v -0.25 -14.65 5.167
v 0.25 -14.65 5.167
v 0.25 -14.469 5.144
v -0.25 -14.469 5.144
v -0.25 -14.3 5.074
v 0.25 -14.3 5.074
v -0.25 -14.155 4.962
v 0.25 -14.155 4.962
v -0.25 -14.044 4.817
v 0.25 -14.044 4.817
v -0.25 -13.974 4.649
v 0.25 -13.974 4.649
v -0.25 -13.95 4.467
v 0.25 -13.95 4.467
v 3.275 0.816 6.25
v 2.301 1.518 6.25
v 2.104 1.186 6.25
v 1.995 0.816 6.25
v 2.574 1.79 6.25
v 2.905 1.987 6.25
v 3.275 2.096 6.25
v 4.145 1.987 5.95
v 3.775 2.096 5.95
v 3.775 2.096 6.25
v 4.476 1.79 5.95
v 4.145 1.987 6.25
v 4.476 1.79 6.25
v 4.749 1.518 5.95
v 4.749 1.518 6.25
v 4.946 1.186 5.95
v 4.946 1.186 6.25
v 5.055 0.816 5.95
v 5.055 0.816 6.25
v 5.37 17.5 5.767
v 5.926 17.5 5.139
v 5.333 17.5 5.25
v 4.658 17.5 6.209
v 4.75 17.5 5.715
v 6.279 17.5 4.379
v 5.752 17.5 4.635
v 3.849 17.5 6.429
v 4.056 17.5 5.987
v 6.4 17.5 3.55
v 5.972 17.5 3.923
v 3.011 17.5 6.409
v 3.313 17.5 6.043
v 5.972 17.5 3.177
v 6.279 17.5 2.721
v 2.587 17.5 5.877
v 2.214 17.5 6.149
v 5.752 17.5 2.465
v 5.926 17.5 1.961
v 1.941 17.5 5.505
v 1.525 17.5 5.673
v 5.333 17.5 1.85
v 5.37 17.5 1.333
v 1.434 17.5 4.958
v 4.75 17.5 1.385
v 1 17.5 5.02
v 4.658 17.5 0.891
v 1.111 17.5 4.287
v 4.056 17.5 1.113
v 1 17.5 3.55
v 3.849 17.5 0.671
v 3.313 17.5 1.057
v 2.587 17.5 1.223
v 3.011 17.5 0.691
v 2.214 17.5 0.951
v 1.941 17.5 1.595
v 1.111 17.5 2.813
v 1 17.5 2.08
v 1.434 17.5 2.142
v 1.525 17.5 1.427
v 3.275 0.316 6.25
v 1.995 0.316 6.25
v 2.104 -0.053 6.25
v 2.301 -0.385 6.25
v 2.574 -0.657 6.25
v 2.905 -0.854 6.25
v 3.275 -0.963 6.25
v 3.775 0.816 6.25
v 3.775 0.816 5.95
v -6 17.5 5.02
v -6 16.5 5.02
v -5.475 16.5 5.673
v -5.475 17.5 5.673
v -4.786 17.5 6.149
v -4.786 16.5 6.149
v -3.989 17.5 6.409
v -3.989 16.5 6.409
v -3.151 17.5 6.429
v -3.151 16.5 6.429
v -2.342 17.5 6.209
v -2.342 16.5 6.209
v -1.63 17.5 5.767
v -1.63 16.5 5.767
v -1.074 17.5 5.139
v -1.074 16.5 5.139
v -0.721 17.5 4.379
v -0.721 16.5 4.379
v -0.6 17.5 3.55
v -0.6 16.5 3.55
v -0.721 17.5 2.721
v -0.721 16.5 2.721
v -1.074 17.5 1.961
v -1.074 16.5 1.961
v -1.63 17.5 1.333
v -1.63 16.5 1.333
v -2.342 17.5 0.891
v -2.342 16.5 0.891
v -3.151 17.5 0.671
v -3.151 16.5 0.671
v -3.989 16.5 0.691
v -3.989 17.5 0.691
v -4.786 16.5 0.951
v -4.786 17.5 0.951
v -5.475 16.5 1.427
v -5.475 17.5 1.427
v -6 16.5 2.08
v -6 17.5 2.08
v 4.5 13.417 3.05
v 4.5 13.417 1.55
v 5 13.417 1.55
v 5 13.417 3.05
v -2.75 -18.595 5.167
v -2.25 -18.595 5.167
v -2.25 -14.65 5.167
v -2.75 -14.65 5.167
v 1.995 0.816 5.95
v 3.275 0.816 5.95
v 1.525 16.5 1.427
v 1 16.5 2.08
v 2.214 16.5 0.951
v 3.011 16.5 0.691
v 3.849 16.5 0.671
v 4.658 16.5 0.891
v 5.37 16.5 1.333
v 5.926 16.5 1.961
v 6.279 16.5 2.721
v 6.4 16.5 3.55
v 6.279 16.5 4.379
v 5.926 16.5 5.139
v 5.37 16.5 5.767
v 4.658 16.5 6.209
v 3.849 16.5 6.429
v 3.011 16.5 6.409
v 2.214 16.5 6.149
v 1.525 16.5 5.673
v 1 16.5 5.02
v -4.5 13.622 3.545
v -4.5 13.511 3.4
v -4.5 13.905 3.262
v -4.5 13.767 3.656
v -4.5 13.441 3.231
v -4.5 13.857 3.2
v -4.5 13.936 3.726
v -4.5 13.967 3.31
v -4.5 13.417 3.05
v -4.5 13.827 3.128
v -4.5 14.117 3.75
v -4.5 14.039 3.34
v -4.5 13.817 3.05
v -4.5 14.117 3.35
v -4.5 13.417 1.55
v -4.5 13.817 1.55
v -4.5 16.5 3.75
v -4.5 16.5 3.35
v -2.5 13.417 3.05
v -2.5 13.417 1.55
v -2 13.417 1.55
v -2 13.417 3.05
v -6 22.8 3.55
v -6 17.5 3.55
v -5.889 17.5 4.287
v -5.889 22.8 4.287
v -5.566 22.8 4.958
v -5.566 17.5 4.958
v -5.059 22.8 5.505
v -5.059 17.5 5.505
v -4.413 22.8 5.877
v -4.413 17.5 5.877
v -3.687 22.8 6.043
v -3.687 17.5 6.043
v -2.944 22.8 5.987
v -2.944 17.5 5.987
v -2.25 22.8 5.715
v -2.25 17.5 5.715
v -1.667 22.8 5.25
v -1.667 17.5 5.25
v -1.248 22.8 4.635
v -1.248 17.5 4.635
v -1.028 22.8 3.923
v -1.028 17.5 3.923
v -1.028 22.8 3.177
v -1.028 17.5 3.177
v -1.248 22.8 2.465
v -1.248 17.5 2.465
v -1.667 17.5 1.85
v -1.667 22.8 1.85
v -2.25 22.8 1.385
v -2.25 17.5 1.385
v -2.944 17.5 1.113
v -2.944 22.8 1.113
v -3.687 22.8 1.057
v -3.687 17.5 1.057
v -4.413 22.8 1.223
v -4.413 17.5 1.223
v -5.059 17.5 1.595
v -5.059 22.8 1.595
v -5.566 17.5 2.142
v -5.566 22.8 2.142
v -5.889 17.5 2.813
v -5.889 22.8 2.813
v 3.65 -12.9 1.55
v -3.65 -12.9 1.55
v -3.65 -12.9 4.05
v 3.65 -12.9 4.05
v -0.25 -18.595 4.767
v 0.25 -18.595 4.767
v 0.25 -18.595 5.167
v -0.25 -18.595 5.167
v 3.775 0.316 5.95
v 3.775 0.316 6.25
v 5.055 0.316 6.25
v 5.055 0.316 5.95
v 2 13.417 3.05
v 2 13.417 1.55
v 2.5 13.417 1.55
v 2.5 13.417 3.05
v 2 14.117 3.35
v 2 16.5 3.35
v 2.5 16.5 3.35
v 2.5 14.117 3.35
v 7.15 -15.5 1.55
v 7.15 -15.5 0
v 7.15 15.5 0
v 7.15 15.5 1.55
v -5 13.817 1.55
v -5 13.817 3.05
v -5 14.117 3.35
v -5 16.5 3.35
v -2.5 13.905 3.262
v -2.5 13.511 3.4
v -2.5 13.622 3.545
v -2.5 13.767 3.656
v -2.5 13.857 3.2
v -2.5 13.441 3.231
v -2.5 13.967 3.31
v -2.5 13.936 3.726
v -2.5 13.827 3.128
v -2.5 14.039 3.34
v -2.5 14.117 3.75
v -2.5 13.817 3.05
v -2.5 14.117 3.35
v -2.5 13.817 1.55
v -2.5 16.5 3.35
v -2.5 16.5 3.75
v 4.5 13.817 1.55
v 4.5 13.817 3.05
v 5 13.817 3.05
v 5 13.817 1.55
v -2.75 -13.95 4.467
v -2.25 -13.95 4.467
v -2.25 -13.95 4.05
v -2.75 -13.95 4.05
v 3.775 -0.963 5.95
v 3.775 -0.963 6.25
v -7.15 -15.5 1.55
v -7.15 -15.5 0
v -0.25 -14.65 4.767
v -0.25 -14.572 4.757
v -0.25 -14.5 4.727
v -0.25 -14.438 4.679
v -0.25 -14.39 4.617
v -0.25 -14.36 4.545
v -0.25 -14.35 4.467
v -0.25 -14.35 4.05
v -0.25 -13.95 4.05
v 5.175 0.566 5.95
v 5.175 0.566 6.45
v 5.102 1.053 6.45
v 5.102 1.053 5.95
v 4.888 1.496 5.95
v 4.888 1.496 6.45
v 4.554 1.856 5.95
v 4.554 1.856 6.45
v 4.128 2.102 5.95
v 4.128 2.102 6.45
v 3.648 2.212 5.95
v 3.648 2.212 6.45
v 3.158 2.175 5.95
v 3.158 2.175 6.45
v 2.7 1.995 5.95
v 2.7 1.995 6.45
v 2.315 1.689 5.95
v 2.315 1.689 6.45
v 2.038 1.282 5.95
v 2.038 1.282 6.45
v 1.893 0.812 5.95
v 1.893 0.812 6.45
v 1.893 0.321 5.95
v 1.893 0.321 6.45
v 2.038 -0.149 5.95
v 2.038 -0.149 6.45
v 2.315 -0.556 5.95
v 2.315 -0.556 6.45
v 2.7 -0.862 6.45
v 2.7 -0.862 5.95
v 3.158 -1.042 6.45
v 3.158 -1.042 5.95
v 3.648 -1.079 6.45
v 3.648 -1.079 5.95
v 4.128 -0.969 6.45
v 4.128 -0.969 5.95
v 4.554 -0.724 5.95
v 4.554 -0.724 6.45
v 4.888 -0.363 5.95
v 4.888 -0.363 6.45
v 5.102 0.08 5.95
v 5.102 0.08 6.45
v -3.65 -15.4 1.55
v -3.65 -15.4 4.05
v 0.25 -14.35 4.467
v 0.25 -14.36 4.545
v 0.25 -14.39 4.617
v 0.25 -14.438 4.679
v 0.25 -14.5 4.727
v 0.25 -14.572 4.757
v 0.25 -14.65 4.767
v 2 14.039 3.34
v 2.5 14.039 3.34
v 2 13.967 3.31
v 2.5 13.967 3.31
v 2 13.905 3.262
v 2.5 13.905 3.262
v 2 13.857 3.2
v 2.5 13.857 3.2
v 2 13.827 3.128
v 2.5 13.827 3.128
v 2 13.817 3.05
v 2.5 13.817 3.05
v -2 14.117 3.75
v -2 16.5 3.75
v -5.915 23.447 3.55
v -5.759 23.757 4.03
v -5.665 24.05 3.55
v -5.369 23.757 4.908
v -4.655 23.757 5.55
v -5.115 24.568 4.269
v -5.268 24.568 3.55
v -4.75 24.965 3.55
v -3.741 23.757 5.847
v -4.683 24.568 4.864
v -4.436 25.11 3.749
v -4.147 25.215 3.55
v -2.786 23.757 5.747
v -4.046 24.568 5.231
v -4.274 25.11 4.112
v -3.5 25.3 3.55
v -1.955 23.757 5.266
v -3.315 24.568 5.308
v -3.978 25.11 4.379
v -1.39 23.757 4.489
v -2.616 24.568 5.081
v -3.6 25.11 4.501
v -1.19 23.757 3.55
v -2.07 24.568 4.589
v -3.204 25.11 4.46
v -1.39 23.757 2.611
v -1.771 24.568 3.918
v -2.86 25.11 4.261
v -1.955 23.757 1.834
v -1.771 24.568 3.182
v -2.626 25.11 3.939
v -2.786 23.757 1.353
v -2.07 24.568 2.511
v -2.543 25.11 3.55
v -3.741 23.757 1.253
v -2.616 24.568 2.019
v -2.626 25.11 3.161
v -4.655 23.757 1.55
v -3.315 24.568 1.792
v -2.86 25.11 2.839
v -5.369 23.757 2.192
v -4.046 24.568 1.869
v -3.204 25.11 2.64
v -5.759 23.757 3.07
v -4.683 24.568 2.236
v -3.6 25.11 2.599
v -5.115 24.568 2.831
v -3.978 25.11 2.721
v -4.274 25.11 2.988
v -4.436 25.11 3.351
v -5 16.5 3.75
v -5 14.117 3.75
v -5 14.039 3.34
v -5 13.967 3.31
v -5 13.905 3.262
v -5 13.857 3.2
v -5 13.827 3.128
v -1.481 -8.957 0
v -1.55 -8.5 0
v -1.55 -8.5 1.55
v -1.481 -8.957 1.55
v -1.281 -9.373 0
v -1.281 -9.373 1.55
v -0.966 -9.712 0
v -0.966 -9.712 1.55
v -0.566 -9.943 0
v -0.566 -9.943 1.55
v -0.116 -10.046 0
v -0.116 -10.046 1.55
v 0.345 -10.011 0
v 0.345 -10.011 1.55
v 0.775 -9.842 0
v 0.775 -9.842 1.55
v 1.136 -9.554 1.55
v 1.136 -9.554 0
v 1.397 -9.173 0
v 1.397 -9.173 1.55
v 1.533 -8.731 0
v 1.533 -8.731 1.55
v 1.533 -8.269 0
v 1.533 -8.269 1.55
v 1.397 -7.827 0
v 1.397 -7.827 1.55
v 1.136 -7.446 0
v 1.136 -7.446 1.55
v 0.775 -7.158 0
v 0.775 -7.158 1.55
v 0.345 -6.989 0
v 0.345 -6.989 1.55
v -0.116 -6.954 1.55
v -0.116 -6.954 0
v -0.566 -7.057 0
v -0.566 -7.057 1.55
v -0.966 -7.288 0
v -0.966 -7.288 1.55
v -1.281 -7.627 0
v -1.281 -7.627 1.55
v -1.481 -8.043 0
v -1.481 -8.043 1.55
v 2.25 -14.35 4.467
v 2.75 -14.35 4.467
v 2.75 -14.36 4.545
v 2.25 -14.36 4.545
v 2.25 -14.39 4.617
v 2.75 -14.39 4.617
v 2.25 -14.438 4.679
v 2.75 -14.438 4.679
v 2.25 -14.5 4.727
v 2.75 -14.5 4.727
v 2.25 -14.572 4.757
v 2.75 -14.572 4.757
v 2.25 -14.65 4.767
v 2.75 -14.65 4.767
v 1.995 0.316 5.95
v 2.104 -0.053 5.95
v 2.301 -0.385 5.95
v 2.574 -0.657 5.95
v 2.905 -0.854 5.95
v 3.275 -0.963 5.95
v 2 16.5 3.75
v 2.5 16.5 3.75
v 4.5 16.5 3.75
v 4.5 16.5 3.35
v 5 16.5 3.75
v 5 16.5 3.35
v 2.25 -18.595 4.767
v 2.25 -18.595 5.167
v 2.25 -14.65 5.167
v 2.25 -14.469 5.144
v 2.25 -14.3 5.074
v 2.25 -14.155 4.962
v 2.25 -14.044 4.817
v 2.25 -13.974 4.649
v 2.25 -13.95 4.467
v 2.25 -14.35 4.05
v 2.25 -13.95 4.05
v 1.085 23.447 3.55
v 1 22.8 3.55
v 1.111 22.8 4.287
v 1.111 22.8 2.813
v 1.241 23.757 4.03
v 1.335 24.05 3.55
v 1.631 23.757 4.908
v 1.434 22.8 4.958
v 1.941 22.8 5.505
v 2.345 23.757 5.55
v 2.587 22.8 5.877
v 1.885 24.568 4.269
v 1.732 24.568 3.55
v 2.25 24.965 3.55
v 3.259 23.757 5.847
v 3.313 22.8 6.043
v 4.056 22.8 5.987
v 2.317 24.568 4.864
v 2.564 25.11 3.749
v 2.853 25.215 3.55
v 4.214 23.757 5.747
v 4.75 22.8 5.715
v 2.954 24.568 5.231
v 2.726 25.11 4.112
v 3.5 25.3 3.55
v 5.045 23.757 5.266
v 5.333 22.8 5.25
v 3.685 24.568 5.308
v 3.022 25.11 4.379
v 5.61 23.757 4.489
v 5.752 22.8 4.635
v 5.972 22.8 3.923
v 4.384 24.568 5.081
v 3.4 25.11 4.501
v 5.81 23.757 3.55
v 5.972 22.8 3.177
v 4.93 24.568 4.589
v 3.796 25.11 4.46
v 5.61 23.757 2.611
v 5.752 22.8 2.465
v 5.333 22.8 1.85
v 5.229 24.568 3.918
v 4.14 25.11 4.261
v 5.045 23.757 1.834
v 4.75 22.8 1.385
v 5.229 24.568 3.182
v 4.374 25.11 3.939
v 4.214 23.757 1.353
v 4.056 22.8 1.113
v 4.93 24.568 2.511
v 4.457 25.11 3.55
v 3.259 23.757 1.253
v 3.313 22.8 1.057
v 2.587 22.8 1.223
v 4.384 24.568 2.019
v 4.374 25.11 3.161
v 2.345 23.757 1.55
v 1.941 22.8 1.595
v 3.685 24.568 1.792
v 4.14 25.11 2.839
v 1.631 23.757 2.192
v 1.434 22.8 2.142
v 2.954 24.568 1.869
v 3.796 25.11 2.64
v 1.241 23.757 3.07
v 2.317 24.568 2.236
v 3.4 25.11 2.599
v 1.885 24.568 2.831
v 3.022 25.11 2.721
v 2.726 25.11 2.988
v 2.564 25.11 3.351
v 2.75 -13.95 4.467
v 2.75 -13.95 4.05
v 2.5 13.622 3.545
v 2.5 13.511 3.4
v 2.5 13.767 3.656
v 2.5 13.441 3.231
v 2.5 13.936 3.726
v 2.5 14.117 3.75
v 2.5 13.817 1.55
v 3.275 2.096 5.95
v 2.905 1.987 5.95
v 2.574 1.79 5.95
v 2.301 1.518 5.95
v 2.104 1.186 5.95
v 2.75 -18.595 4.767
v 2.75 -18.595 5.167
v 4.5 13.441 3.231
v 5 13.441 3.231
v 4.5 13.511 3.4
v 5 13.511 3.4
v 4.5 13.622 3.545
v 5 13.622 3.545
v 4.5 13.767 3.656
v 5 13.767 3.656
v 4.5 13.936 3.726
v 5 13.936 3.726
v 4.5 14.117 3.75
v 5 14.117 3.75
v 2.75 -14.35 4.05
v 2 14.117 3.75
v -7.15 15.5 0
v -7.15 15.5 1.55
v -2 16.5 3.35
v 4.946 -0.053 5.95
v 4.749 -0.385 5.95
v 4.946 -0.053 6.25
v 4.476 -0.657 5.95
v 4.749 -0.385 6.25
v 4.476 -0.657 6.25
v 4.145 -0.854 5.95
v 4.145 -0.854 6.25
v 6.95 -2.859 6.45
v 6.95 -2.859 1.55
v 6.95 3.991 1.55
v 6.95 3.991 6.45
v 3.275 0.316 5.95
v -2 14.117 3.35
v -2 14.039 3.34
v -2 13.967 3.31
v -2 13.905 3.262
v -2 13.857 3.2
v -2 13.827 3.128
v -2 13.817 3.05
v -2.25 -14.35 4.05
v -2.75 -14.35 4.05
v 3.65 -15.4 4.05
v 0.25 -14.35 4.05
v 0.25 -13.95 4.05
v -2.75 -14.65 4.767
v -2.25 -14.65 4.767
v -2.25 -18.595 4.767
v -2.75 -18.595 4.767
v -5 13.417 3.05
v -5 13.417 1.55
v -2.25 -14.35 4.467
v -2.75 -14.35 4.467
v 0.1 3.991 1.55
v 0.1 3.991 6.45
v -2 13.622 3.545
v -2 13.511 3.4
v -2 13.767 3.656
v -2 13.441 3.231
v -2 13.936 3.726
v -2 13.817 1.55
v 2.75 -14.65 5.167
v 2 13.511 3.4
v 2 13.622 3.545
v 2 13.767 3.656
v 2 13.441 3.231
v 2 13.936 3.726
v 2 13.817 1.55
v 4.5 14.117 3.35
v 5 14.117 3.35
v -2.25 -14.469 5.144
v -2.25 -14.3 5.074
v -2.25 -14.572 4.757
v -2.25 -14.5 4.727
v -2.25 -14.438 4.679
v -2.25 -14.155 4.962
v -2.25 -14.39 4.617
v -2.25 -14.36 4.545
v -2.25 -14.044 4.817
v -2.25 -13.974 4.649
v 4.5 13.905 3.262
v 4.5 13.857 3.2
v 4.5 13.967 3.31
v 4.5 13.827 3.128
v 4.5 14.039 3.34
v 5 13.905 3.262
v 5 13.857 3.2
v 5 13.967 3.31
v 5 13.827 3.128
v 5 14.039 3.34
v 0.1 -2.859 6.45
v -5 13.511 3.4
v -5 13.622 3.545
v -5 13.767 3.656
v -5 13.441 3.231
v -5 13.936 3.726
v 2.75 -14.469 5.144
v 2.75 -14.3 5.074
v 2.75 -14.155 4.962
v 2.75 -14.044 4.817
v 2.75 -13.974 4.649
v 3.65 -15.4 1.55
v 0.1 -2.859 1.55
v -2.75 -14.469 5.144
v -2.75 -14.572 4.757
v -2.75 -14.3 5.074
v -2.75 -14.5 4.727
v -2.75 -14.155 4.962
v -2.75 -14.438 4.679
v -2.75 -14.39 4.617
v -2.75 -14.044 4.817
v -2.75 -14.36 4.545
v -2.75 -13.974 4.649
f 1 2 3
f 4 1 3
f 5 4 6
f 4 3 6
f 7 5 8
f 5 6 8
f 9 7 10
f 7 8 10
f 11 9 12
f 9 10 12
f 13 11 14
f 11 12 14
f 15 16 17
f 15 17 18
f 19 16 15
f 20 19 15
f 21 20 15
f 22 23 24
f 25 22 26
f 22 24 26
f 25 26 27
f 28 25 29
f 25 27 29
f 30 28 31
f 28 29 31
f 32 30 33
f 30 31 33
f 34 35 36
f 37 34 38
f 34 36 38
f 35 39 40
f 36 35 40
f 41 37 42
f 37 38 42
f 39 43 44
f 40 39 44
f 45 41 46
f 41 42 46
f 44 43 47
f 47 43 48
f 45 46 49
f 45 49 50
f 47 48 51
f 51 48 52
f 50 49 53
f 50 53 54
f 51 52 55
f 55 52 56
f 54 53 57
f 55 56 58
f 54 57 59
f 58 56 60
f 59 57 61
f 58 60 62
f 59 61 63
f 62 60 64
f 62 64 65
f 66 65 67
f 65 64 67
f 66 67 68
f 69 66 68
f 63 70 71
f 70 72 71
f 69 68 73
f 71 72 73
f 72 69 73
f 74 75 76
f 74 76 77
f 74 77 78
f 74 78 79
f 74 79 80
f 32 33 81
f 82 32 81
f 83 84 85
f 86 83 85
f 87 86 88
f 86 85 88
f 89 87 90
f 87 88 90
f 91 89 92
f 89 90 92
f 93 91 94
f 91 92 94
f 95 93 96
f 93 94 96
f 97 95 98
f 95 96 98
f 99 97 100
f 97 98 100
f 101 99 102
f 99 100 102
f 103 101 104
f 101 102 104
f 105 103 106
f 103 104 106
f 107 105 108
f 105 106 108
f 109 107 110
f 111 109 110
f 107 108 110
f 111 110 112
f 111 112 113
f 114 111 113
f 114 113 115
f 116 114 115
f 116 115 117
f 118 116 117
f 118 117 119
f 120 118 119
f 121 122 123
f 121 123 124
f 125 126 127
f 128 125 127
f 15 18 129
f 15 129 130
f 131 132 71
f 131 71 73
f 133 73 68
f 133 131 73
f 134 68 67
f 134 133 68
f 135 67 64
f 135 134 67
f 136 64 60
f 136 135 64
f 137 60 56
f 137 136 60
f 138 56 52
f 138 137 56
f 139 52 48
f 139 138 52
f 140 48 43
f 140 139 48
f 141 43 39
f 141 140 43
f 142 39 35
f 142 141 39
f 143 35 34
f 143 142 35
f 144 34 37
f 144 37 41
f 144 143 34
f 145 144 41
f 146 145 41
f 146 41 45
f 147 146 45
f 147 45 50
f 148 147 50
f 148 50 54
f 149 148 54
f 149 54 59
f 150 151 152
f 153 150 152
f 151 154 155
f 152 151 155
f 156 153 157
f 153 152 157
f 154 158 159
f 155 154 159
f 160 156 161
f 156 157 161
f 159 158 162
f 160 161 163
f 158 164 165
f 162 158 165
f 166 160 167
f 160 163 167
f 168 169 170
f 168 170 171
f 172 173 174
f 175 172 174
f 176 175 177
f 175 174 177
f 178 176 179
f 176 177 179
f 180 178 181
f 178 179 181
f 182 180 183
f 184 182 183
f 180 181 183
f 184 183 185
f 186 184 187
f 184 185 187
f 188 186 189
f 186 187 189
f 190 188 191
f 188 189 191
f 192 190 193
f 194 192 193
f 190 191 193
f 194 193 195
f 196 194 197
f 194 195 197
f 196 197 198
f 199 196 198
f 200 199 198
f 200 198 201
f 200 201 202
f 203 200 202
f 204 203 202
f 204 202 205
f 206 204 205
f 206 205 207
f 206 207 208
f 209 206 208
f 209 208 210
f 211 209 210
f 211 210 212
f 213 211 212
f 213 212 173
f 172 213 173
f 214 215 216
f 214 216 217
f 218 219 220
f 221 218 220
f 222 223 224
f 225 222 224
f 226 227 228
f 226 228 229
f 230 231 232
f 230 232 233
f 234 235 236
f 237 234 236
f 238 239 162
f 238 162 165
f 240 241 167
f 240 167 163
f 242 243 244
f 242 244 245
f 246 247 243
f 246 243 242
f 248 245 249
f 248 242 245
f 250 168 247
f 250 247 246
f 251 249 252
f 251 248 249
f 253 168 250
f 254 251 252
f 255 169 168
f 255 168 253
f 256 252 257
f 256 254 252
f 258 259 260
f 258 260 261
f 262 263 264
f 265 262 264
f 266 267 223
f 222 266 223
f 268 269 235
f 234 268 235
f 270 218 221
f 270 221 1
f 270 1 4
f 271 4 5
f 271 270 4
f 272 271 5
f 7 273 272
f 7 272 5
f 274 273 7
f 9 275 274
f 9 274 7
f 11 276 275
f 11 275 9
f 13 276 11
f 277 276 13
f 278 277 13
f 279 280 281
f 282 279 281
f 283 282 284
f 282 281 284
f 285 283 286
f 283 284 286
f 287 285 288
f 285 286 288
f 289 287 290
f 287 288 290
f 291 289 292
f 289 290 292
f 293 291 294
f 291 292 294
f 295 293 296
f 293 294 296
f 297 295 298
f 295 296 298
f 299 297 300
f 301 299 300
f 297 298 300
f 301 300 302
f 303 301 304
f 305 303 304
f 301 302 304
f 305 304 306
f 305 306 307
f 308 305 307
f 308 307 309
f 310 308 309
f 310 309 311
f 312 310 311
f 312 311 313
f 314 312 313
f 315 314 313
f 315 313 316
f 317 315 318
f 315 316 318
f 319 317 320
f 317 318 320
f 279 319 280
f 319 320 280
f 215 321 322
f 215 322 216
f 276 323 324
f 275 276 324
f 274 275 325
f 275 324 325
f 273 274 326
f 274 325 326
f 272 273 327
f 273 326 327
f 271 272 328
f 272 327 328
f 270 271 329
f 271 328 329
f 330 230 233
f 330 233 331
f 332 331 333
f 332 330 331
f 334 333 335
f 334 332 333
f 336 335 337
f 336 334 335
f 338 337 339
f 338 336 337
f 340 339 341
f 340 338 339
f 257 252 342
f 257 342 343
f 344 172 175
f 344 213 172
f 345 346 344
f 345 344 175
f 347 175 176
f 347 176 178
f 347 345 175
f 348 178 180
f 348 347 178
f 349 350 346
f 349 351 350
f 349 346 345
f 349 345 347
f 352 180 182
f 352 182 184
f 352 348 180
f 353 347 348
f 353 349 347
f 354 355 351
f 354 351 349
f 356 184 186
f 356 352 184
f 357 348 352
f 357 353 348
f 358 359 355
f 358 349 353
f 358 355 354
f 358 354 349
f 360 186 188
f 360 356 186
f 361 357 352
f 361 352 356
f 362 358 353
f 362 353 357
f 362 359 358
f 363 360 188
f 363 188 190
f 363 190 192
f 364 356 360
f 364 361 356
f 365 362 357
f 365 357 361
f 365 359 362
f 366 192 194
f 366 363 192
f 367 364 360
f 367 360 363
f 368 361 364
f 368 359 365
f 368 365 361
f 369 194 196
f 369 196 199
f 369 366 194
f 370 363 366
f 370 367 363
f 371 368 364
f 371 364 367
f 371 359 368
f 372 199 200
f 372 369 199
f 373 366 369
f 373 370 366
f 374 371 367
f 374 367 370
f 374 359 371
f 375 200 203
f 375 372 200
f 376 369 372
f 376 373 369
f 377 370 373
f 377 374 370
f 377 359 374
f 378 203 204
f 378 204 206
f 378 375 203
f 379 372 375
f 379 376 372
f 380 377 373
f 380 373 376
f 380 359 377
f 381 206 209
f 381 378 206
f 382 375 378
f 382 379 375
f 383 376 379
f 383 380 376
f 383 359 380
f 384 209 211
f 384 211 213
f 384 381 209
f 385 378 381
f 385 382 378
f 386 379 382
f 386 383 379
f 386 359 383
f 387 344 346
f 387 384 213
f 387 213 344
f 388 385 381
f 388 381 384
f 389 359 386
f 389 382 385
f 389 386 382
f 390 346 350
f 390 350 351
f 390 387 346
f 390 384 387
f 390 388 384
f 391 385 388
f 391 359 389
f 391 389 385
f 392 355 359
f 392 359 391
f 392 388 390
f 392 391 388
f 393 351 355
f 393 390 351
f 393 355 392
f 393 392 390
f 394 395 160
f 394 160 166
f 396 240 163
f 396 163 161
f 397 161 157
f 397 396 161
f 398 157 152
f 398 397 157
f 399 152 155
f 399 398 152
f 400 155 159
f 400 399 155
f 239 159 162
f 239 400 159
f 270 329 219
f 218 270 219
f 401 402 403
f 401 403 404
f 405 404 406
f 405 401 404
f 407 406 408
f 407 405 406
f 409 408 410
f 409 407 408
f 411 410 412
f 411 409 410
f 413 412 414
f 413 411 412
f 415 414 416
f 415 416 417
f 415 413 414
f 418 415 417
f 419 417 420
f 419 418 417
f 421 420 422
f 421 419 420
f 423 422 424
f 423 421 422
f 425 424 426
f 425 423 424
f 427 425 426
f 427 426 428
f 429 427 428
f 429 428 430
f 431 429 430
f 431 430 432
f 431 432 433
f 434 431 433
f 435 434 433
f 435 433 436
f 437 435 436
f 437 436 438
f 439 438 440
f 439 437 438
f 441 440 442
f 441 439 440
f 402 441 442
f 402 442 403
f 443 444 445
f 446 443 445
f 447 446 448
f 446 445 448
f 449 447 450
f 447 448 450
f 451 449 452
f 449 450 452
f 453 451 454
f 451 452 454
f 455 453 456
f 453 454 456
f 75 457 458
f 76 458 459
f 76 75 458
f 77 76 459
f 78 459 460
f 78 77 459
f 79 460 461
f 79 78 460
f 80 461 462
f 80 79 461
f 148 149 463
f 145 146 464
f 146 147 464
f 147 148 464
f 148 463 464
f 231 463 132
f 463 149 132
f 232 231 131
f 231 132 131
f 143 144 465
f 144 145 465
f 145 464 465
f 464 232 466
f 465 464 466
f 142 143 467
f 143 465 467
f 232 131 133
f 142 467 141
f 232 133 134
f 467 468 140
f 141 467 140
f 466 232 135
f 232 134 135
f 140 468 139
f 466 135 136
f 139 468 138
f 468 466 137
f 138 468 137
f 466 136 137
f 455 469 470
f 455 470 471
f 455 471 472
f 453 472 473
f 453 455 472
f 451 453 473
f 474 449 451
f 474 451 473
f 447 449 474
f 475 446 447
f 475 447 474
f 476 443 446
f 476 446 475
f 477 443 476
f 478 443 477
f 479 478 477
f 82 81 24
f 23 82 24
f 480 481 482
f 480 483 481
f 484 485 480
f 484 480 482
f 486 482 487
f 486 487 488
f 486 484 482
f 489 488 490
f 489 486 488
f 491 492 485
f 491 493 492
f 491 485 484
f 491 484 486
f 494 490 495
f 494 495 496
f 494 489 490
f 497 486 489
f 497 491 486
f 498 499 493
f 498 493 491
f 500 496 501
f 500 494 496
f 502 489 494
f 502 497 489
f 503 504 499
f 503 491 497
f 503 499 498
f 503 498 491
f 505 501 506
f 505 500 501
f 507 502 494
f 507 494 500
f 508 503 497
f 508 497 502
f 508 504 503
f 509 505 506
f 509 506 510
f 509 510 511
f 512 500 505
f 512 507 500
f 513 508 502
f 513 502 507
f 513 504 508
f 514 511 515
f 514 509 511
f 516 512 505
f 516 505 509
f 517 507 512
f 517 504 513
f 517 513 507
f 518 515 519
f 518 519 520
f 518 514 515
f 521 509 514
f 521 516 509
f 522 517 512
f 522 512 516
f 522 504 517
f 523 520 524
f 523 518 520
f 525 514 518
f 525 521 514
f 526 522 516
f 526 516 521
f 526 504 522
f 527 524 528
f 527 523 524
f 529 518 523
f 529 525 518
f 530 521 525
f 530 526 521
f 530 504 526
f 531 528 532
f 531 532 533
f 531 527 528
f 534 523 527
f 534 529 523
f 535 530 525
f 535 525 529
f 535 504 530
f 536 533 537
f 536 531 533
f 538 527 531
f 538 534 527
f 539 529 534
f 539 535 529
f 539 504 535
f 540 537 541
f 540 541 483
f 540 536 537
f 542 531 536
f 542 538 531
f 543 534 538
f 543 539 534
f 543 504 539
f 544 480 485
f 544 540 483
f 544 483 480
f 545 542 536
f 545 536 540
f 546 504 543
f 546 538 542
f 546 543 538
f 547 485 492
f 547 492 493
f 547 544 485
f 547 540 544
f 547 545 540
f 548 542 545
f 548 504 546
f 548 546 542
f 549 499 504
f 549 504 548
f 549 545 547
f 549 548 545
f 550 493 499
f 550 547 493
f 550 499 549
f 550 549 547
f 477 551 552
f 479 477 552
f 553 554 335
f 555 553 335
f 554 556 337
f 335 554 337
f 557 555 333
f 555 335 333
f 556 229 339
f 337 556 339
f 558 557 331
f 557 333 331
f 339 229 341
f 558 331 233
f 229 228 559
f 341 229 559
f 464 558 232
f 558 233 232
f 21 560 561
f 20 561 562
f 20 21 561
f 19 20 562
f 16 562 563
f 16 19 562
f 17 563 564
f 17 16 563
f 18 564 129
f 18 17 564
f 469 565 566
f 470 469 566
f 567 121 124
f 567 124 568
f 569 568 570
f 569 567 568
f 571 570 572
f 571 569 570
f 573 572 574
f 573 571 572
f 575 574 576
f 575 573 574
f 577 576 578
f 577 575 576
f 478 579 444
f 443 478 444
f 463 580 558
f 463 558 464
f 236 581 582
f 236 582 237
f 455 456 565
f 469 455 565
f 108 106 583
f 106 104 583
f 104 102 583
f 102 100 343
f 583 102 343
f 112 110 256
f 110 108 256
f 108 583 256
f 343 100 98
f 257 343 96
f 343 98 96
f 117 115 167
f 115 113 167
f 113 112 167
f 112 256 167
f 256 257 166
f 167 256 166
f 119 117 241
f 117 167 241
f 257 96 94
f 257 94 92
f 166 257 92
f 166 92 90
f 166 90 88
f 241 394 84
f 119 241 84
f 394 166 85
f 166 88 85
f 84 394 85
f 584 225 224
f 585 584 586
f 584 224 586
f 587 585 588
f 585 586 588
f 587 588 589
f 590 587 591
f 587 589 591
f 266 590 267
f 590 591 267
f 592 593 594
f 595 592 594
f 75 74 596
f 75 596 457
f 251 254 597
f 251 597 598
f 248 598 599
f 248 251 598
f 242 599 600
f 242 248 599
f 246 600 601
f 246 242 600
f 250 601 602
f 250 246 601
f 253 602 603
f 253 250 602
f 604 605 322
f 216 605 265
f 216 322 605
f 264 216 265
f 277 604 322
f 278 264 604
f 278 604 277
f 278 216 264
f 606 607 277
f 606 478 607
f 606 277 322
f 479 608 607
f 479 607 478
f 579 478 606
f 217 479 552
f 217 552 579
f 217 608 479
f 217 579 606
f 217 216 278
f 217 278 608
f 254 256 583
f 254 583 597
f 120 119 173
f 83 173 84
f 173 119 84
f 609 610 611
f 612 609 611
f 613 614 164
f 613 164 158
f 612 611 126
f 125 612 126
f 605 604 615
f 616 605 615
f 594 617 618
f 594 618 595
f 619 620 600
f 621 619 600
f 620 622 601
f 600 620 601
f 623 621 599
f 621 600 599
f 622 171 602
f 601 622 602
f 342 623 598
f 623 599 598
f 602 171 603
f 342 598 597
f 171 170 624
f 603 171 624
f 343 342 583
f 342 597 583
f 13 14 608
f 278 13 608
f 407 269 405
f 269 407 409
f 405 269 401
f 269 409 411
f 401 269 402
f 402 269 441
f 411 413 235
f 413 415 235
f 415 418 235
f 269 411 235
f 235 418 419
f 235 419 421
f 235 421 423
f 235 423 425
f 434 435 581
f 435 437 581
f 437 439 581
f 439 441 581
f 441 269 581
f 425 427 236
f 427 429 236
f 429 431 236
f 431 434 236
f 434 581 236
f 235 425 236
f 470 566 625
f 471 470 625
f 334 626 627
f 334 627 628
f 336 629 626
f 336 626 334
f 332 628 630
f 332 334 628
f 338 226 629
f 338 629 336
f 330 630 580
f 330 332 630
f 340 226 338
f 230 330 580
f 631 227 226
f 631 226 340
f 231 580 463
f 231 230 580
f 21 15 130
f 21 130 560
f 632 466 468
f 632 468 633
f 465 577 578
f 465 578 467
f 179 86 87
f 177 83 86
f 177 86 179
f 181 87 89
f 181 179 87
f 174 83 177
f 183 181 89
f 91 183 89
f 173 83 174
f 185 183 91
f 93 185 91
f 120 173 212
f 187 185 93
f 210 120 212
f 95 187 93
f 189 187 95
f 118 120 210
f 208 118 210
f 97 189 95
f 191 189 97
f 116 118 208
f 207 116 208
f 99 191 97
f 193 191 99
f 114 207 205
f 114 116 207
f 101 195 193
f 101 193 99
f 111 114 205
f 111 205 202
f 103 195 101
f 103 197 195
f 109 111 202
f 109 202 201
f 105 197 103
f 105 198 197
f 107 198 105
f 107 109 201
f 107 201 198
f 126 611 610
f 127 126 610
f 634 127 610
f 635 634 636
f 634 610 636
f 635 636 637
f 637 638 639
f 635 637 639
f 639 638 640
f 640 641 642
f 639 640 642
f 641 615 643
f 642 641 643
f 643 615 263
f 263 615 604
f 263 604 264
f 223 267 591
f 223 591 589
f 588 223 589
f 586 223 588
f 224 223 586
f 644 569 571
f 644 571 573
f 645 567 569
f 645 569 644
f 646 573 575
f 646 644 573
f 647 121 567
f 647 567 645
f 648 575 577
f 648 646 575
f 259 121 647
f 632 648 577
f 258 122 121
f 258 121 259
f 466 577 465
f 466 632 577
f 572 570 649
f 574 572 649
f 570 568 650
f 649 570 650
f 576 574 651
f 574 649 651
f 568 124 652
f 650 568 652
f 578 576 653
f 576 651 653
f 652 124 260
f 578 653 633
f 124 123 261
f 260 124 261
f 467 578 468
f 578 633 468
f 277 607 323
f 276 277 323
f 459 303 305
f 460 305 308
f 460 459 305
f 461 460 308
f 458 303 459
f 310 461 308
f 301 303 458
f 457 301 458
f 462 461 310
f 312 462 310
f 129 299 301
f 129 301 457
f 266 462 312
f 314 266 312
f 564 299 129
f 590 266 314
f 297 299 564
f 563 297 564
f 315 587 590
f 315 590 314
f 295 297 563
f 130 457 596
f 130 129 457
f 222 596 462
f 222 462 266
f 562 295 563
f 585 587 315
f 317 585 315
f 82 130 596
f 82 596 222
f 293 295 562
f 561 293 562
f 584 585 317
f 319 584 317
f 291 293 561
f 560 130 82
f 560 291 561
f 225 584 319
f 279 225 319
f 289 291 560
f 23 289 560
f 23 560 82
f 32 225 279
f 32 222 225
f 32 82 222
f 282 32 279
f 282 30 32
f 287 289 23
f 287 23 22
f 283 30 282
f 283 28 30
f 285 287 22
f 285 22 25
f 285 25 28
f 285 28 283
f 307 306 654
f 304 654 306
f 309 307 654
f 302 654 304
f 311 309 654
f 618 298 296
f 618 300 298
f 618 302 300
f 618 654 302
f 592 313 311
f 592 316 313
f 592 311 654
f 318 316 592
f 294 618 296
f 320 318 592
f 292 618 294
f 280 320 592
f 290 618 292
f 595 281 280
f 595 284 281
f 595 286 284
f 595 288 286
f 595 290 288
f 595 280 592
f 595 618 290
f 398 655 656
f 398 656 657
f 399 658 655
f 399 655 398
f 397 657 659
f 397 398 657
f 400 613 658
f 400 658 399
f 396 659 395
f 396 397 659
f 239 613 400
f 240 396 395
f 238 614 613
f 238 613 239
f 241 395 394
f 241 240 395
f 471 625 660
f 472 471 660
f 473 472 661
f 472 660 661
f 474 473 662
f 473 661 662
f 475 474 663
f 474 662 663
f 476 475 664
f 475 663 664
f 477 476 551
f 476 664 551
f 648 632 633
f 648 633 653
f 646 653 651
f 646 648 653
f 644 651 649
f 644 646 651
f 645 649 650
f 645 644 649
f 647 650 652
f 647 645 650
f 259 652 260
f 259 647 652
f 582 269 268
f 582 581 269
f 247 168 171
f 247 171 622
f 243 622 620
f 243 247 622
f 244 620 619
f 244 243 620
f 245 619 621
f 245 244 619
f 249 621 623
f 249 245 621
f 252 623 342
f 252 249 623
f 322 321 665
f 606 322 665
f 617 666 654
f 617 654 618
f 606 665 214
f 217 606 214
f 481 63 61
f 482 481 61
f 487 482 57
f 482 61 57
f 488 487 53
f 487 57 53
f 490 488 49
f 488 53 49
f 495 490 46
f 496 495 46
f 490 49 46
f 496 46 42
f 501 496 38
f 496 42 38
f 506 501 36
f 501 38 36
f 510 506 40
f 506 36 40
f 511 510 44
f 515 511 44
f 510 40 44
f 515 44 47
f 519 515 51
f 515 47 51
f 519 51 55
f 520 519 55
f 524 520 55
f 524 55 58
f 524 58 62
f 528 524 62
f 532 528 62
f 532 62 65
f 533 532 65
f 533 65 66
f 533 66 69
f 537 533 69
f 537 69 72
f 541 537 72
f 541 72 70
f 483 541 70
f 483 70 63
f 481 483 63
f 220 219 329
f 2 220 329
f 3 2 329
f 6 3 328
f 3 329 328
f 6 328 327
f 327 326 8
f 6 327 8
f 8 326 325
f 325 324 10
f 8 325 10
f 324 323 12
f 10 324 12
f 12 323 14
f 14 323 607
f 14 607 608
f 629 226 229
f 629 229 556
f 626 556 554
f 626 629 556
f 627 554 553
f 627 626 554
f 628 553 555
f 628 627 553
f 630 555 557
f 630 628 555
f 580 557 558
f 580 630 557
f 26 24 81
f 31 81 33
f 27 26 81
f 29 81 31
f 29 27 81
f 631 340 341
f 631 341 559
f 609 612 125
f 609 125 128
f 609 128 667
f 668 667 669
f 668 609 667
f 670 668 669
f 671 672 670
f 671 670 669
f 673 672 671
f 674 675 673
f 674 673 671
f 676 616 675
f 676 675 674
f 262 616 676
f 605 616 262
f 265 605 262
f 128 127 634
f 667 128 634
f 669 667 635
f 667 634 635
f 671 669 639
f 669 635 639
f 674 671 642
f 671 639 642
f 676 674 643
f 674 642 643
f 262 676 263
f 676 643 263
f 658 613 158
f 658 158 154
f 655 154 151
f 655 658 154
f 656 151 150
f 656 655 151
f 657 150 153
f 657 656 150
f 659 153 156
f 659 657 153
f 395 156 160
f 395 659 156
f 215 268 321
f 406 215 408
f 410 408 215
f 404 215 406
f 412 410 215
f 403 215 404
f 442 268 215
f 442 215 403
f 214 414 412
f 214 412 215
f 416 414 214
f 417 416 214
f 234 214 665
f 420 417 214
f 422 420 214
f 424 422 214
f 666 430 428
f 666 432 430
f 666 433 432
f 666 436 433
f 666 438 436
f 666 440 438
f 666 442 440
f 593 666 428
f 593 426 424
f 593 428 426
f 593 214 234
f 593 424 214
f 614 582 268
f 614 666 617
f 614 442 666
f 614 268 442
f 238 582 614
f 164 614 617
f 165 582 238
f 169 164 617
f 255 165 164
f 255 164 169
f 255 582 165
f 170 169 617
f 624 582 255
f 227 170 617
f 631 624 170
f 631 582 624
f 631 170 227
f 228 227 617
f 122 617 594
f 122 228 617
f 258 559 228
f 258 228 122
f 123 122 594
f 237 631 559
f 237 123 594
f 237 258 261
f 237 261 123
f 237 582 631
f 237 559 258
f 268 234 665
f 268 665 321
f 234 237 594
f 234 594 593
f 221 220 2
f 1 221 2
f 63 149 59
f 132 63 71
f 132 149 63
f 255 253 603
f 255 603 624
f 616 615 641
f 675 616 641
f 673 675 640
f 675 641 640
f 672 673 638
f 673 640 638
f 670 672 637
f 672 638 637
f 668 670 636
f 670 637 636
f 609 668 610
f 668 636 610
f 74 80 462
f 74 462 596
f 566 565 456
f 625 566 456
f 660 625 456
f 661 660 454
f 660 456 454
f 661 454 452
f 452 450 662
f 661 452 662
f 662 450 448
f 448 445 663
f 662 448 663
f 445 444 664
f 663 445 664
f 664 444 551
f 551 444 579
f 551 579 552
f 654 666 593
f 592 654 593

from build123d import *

# Parameters (mm, degrees)
ESBO_O1_W                   = 14.3
ESBO_O1_H                   = 31
ESBO_O1_R                   = 1.55
RESSALTO_EXTRUS_O1_DEPTH    = 1.55
ESBO_O2_W                   = 6.85
ESBO_O2_H                   = 6.85
RESSALTO_EXTRUS_O2_DEPTH    = 6.45
ESBO_O3_R                   = 1.65
CORTE_EXTRUS_O1_DEPTH       = 0.5
ESBO_O4_W                   = 7.3
ESBO_O4_H                   = 2.5
RESSALTO_EXTRUS_O3_DEPTH    = 4.05
RESSALTO_EXTRUS_O4_DEPTH    = 1
RESSALTO_EXTRUS_O4_2_DEPTH  = 1
ESBO_O6_R                   = 2.5
RESSALTO_EXTRUS_O5_DEPTH    = 8.8
FILETE1_R                   = 2.5
FILETE2_R                   = 2.5
RESSALTO_EXTRUS_O6_DEPTH    = 13.8
ESBO_O9_R                   = 1.55
CORTE_EXTRUS_O3_DEPTH       = 0.2
CORTE_EXTRUS_O2_START       = -2.2
CORTE_EXTRUS_O2_OUTLINE_W   = 1.65
CORTE_EXTRUS_O2_OUTLINE_H   = 3.08301819
CORTE_EXTRUS_O2_OUTLINE_W_2 = 2
CORTE_EXTRUS_O2_OUTLINE_W_3 = 4
CORTE_EXTRUS_O2_OUTLINE_W_4 = 2.15
CORTE_EXTRUS_O2_DEPTH       = 2.2
RESSALTO_EXTRUS_O7_START    = -7.3
RESSALTO_EXTRUS_O7_DEPTH    = 7.3
ESBO_O12_W                  = 1.34798559
ESBO_O12_H                  = 5.991047065
ESBO_O12_W_2                = 0.998507844
ESBO_O12_W_3                = 2
CORTE_EXTRUS_O4_DEPTH       = 2.2


# Read off the part's stored shape, not the designer's step: Corte-extrusão2, Ressalto-extrusão7
with BuildPart() as part:
    # Esboço1 → Ressalto-extrusão1 (new body)
    with BuildSketch(Plane.XY):
        Rectangle(ESBO_O1_W, ESBO_O1_H)
        with Locations(Location((0, -8.5, 0), (0, 0, 180))):
            Circle(ESBO_O1_R, mode=Mode.SUBTRACT)
    extrude(amount=RESSALTO_EXTRUS_O1_DEPTH)

    # Esboço2 → Ressalto-extrusão2 (add)
    with BuildSketch(Plane.XY):
        with Locations((3.525, 0.5664641)):
            Rectangle(ESBO_O2_W, ESBO_O2_H)
    extrude(amount=RESSALTO_EXTRUS_O2_DEPTH)

    # Esboço3 → Corte-extrusão1 (cut)
    with BuildSketch(Plane.XY.offset(6.45)):
        with Locations((3.525, 0.5664641)):
            Circle(ESBO_O3_R)
        with BuildLine():
            Line((3.775, 0.8164641), (3.775, 2.096169954))
            ThreePointArc((3.775, 2.096169954), (4.621015511, 1.662479611), (5.054705854, 0.8164641))
            Line((5.054705854, 0.8164641), (3.775, 0.8164641))
        make_face(mode=Mode.SUBTRACT)
        with BuildLine():
            Line((3.775, -0.963241754), (3.775, 0.3164641))
            Line((3.775, 0.3164641), (5.054705854, 0.3164641))
            ThreePointArc((5.054705854, 0.3164641), (4.621015511, -0.529551411), (3.775, -0.963241754))
        make_face(mode=Mode.SUBTRACT)
        with BuildLine():
            Line((3.275, -0.963241754), (3.275, 0.3164641))
            Line((3.275, 0.3164641), (1.995294146, 0.3164641))
            ThreePointArc((1.995294146, 0.3164641), (2.428984489, -0.529551411), (3.275, -0.963241754))
        make_face(mode=Mode.SUBTRACT)
        with BuildLine():
            Line((3.275, 0.8164641), (3.275, 2.096169954))
            ThreePointArc((3.275, 2.096169954), (2.428984489, 1.662479611), (1.995294146, 0.8164641))
            Line((1.995294146, 0.8164641), (3.275, 0.8164641))
        make_face(mode=Mode.SUBTRACT)
    extrude(amount=-CORTE_EXTRUS_O1_DEPTH, mode=Mode.SUBTRACT)

    # Esboço4 → Ressalto-extrusão3 (add)
    with BuildSketch(Plane.XY):
        with Locations((0, -14.15)):
            Rectangle(ESBO_O4_W, ESBO_O4_H)
    extrude(amount=RESSALTO_EXTRUS_O3_DEPTH)



with BuildPart() as body_2:
    # Esboço5 → Ressalto-extrusão4 (new body)
    with BuildSketch(Plane(origin=(0, 16.5, 0), x_dir=(1, 0, 0), z_dir=(0, 1, 0))):
        with BuildLine():
            Line((1, -5.019693846), (1, -2.080306154))
            ThreePointArc((1, -2.080306154), (6.4, -3.55), (1, -5.019693846))
        make_face()
    extrude(amount=RESSALTO_EXTRUS_O4_DEPTH)



with BuildPart() as body_3:
    # Esboço5 → Ressalto-extrus_o4 2 (new body)
    with BuildSketch(Plane(origin=(0, 16.5, 0), x_dir=(1, 0, 0), z_dir=(0, 1, 0))):
        with BuildLine():
            Line((-6, -2.080306154), (-6, -5.019693846))
            ThreePointArc((-6, -5.019693846), (-0.6, -3.55), (-6, -2.080306154))
        make_face()
    extrude(amount=RESSALTO_EXTRUS_O4_2_DEPTH)


with BuildPart() as body_2_1:
    add(body_2.part)

    add(body_3.part)  # Ressalto-extrusão5 merges body 3
    # Esboço6 → Ressalto-extrusão5 (add)
    with BuildSketch(Plane(origin=(0, 16.5, 0), x_dir=(1, 0, 0), z_dir=(0, 1, 0))):
        with Locations(Location((3.5, -3.55, 0), (0, 0, 180))):
            Circle(ESBO_O6_R)
        with Locations(Location((-3.5, -3.55, 0), (0, 0, 180))):
            Circle(ESBO_O6_R)
    extrude(amount=RESSALTO_EXTRUS_O5_DEPTH)

    # Filete1
    filete1_edges = [body_2_1.edges().sort_by_distance(p)[0] for p in [
        (-1, 25.3, 3.55),
    ]]
    fillet(filete1_edges, radius=FILETE1_R)

    # Filete2
    filete2_edges = [body_2_1.edges().sort_by_distance(p)[0] for p in [
        (6, 25.3, 3.55),
    ]]
    fillet(filete2_edges, radius=FILETE2_R)


with BuildPart() as part_1:
    add(part.part)

    add(body_2_1.part)  # Ressalto-extrusão6 merges body 2
    # Esboço7 → Ressalto-extrusão6 (add)
    with BuildSketch(Plane.ZY.offset(7.15)):
        with BuildLine():
            Line((3.35, 16.5), (3.35, 14.11698181))
            ThreePointArc((3.35, 14.11698181), (3.262132034, 13.904849775), (3.05, 13.81698181))
            Line((3.05, 13.81698181), (1.55, 13.81698181))
            Line((1.55, 13.81698181), (1.55, 13.41698181))
            Line((1.55, 13.41698181), (3.05, 13.41698181))
            ThreePointArc((3.05, 13.41698181), (3.544974747, 13.622007063), (3.75, 14.11698181))
            Line((3.75, 14.11698181), (3.75, 16.5))
            Line((3.75, 16.5), (3.35, 16.5))
        make_face()
    extrude(amount=-RESSALTO_EXTRUS_O6_DEPTH)

    # Esboço9 → Corte-extrusão3 (cut)
    with BuildSketch(Plane.XY.offset(6.45)):
        with Locations((3.525, 0.5664641)):
            Circle(ESBO_O9_R)
    extrude(amount=-CORTE_EXTRUS_O3_DEPTH, mode=Mode.SUBTRACT)

    # Corte-extrusão2 outline → Corte-extrusão2 (cut)
    with BuildSketch(Plane.XY.offset(3.75).offset(CORTE_EXTRUS_O2_START)):
        with Locations((5.825, 14.958490905)):
            Rectangle(CORTE_EXTRUS_O2_OUTLINE_W, CORTE_EXTRUS_O2_OUTLINE_H)
        with Locations((3.5, 14.958490905)):
            Rectangle(CORTE_EXTRUS_O2_OUTLINE_W_2, CORTE_EXTRUS_O2_OUTLINE_H)
        with Locations((0, 14.958490905)):
            Rectangle(CORTE_EXTRUS_O2_OUTLINE_W_3, CORTE_EXTRUS_O2_OUTLINE_H)
        with Locations((-3.5, 14.958490905)):
            Rectangle(CORTE_EXTRUS_O2_OUTLINE_W_2, CORTE_EXTRUS_O2_OUTLINE_H)
        with Locations((-6.075, 14.958490905)):
            Rectangle(CORTE_EXTRUS_O2_OUTLINE_W_4, CORTE_EXTRUS_O2_OUTLINE_H)
    extrude(amount=CORTE_EXTRUS_O2_DEPTH, mode=Mode.SUBTRACT)

    # Ressalto-extrusão7 outline → Ressalto-extrusão7 (add)
    with BuildSketch(Plane.ZY.offset(3.65).offset(RESSALTO_EXTRUS_O7_START)):
        with BuildLine():
            ThreePointArc((5.167357012, -14.65), (4.962331759, -14.155025253), (4.467357012, -13.95))
            Line((4.467357012, -13.95), (4.05, -13.95))
            Line((4.05, -13.95), (4.05, -14.35))
            Line((4.05, -14.35), (4.467357012, -14.35))
            ThreePointArc((4.467357012, -14.35), (4.679489046, -14.437867966), (4.767357012, -14.65))
            Line((4.767357012, -14.65), (4.767357012, -18.595051461))
            Line((4.767357012, -18.595051461), (5.167357012, -18.595051461))
            Line((5.167357012, -18.595051461), (5.167357012, -14.65))
        make_face()
    extrude(amount=RESSALTO_EXTRUS_O7_DEPTH)

    # Esboço12 → Corte-extrusão4 (cut)
    with BuildSketch(Plane.XY.offset(4.05)):
        with Locations((-3.423992795, -16.372351479)):
            Rectangle(ESBO_O12_W, ESBO_O12_H)
        with Locations((3.249253922, -16.372351479)):
            Rectangle(ESBO_O12_W_2, ESBO_O12_H)
        with Locations((-1.25, -16.372351479)):
            Rectangle(ESBO_O12_W_3, ESBO_O12_H)
        with Locations((1.25, -16.372351479)):
            Rectangle(ESBO_O12_W_3, ESBO_O12_H)
    extrude(amount=CORTE_EXTRUS_O4_DEPTH, mode=Mode.SUBTRACT)


solid = part_1.part
